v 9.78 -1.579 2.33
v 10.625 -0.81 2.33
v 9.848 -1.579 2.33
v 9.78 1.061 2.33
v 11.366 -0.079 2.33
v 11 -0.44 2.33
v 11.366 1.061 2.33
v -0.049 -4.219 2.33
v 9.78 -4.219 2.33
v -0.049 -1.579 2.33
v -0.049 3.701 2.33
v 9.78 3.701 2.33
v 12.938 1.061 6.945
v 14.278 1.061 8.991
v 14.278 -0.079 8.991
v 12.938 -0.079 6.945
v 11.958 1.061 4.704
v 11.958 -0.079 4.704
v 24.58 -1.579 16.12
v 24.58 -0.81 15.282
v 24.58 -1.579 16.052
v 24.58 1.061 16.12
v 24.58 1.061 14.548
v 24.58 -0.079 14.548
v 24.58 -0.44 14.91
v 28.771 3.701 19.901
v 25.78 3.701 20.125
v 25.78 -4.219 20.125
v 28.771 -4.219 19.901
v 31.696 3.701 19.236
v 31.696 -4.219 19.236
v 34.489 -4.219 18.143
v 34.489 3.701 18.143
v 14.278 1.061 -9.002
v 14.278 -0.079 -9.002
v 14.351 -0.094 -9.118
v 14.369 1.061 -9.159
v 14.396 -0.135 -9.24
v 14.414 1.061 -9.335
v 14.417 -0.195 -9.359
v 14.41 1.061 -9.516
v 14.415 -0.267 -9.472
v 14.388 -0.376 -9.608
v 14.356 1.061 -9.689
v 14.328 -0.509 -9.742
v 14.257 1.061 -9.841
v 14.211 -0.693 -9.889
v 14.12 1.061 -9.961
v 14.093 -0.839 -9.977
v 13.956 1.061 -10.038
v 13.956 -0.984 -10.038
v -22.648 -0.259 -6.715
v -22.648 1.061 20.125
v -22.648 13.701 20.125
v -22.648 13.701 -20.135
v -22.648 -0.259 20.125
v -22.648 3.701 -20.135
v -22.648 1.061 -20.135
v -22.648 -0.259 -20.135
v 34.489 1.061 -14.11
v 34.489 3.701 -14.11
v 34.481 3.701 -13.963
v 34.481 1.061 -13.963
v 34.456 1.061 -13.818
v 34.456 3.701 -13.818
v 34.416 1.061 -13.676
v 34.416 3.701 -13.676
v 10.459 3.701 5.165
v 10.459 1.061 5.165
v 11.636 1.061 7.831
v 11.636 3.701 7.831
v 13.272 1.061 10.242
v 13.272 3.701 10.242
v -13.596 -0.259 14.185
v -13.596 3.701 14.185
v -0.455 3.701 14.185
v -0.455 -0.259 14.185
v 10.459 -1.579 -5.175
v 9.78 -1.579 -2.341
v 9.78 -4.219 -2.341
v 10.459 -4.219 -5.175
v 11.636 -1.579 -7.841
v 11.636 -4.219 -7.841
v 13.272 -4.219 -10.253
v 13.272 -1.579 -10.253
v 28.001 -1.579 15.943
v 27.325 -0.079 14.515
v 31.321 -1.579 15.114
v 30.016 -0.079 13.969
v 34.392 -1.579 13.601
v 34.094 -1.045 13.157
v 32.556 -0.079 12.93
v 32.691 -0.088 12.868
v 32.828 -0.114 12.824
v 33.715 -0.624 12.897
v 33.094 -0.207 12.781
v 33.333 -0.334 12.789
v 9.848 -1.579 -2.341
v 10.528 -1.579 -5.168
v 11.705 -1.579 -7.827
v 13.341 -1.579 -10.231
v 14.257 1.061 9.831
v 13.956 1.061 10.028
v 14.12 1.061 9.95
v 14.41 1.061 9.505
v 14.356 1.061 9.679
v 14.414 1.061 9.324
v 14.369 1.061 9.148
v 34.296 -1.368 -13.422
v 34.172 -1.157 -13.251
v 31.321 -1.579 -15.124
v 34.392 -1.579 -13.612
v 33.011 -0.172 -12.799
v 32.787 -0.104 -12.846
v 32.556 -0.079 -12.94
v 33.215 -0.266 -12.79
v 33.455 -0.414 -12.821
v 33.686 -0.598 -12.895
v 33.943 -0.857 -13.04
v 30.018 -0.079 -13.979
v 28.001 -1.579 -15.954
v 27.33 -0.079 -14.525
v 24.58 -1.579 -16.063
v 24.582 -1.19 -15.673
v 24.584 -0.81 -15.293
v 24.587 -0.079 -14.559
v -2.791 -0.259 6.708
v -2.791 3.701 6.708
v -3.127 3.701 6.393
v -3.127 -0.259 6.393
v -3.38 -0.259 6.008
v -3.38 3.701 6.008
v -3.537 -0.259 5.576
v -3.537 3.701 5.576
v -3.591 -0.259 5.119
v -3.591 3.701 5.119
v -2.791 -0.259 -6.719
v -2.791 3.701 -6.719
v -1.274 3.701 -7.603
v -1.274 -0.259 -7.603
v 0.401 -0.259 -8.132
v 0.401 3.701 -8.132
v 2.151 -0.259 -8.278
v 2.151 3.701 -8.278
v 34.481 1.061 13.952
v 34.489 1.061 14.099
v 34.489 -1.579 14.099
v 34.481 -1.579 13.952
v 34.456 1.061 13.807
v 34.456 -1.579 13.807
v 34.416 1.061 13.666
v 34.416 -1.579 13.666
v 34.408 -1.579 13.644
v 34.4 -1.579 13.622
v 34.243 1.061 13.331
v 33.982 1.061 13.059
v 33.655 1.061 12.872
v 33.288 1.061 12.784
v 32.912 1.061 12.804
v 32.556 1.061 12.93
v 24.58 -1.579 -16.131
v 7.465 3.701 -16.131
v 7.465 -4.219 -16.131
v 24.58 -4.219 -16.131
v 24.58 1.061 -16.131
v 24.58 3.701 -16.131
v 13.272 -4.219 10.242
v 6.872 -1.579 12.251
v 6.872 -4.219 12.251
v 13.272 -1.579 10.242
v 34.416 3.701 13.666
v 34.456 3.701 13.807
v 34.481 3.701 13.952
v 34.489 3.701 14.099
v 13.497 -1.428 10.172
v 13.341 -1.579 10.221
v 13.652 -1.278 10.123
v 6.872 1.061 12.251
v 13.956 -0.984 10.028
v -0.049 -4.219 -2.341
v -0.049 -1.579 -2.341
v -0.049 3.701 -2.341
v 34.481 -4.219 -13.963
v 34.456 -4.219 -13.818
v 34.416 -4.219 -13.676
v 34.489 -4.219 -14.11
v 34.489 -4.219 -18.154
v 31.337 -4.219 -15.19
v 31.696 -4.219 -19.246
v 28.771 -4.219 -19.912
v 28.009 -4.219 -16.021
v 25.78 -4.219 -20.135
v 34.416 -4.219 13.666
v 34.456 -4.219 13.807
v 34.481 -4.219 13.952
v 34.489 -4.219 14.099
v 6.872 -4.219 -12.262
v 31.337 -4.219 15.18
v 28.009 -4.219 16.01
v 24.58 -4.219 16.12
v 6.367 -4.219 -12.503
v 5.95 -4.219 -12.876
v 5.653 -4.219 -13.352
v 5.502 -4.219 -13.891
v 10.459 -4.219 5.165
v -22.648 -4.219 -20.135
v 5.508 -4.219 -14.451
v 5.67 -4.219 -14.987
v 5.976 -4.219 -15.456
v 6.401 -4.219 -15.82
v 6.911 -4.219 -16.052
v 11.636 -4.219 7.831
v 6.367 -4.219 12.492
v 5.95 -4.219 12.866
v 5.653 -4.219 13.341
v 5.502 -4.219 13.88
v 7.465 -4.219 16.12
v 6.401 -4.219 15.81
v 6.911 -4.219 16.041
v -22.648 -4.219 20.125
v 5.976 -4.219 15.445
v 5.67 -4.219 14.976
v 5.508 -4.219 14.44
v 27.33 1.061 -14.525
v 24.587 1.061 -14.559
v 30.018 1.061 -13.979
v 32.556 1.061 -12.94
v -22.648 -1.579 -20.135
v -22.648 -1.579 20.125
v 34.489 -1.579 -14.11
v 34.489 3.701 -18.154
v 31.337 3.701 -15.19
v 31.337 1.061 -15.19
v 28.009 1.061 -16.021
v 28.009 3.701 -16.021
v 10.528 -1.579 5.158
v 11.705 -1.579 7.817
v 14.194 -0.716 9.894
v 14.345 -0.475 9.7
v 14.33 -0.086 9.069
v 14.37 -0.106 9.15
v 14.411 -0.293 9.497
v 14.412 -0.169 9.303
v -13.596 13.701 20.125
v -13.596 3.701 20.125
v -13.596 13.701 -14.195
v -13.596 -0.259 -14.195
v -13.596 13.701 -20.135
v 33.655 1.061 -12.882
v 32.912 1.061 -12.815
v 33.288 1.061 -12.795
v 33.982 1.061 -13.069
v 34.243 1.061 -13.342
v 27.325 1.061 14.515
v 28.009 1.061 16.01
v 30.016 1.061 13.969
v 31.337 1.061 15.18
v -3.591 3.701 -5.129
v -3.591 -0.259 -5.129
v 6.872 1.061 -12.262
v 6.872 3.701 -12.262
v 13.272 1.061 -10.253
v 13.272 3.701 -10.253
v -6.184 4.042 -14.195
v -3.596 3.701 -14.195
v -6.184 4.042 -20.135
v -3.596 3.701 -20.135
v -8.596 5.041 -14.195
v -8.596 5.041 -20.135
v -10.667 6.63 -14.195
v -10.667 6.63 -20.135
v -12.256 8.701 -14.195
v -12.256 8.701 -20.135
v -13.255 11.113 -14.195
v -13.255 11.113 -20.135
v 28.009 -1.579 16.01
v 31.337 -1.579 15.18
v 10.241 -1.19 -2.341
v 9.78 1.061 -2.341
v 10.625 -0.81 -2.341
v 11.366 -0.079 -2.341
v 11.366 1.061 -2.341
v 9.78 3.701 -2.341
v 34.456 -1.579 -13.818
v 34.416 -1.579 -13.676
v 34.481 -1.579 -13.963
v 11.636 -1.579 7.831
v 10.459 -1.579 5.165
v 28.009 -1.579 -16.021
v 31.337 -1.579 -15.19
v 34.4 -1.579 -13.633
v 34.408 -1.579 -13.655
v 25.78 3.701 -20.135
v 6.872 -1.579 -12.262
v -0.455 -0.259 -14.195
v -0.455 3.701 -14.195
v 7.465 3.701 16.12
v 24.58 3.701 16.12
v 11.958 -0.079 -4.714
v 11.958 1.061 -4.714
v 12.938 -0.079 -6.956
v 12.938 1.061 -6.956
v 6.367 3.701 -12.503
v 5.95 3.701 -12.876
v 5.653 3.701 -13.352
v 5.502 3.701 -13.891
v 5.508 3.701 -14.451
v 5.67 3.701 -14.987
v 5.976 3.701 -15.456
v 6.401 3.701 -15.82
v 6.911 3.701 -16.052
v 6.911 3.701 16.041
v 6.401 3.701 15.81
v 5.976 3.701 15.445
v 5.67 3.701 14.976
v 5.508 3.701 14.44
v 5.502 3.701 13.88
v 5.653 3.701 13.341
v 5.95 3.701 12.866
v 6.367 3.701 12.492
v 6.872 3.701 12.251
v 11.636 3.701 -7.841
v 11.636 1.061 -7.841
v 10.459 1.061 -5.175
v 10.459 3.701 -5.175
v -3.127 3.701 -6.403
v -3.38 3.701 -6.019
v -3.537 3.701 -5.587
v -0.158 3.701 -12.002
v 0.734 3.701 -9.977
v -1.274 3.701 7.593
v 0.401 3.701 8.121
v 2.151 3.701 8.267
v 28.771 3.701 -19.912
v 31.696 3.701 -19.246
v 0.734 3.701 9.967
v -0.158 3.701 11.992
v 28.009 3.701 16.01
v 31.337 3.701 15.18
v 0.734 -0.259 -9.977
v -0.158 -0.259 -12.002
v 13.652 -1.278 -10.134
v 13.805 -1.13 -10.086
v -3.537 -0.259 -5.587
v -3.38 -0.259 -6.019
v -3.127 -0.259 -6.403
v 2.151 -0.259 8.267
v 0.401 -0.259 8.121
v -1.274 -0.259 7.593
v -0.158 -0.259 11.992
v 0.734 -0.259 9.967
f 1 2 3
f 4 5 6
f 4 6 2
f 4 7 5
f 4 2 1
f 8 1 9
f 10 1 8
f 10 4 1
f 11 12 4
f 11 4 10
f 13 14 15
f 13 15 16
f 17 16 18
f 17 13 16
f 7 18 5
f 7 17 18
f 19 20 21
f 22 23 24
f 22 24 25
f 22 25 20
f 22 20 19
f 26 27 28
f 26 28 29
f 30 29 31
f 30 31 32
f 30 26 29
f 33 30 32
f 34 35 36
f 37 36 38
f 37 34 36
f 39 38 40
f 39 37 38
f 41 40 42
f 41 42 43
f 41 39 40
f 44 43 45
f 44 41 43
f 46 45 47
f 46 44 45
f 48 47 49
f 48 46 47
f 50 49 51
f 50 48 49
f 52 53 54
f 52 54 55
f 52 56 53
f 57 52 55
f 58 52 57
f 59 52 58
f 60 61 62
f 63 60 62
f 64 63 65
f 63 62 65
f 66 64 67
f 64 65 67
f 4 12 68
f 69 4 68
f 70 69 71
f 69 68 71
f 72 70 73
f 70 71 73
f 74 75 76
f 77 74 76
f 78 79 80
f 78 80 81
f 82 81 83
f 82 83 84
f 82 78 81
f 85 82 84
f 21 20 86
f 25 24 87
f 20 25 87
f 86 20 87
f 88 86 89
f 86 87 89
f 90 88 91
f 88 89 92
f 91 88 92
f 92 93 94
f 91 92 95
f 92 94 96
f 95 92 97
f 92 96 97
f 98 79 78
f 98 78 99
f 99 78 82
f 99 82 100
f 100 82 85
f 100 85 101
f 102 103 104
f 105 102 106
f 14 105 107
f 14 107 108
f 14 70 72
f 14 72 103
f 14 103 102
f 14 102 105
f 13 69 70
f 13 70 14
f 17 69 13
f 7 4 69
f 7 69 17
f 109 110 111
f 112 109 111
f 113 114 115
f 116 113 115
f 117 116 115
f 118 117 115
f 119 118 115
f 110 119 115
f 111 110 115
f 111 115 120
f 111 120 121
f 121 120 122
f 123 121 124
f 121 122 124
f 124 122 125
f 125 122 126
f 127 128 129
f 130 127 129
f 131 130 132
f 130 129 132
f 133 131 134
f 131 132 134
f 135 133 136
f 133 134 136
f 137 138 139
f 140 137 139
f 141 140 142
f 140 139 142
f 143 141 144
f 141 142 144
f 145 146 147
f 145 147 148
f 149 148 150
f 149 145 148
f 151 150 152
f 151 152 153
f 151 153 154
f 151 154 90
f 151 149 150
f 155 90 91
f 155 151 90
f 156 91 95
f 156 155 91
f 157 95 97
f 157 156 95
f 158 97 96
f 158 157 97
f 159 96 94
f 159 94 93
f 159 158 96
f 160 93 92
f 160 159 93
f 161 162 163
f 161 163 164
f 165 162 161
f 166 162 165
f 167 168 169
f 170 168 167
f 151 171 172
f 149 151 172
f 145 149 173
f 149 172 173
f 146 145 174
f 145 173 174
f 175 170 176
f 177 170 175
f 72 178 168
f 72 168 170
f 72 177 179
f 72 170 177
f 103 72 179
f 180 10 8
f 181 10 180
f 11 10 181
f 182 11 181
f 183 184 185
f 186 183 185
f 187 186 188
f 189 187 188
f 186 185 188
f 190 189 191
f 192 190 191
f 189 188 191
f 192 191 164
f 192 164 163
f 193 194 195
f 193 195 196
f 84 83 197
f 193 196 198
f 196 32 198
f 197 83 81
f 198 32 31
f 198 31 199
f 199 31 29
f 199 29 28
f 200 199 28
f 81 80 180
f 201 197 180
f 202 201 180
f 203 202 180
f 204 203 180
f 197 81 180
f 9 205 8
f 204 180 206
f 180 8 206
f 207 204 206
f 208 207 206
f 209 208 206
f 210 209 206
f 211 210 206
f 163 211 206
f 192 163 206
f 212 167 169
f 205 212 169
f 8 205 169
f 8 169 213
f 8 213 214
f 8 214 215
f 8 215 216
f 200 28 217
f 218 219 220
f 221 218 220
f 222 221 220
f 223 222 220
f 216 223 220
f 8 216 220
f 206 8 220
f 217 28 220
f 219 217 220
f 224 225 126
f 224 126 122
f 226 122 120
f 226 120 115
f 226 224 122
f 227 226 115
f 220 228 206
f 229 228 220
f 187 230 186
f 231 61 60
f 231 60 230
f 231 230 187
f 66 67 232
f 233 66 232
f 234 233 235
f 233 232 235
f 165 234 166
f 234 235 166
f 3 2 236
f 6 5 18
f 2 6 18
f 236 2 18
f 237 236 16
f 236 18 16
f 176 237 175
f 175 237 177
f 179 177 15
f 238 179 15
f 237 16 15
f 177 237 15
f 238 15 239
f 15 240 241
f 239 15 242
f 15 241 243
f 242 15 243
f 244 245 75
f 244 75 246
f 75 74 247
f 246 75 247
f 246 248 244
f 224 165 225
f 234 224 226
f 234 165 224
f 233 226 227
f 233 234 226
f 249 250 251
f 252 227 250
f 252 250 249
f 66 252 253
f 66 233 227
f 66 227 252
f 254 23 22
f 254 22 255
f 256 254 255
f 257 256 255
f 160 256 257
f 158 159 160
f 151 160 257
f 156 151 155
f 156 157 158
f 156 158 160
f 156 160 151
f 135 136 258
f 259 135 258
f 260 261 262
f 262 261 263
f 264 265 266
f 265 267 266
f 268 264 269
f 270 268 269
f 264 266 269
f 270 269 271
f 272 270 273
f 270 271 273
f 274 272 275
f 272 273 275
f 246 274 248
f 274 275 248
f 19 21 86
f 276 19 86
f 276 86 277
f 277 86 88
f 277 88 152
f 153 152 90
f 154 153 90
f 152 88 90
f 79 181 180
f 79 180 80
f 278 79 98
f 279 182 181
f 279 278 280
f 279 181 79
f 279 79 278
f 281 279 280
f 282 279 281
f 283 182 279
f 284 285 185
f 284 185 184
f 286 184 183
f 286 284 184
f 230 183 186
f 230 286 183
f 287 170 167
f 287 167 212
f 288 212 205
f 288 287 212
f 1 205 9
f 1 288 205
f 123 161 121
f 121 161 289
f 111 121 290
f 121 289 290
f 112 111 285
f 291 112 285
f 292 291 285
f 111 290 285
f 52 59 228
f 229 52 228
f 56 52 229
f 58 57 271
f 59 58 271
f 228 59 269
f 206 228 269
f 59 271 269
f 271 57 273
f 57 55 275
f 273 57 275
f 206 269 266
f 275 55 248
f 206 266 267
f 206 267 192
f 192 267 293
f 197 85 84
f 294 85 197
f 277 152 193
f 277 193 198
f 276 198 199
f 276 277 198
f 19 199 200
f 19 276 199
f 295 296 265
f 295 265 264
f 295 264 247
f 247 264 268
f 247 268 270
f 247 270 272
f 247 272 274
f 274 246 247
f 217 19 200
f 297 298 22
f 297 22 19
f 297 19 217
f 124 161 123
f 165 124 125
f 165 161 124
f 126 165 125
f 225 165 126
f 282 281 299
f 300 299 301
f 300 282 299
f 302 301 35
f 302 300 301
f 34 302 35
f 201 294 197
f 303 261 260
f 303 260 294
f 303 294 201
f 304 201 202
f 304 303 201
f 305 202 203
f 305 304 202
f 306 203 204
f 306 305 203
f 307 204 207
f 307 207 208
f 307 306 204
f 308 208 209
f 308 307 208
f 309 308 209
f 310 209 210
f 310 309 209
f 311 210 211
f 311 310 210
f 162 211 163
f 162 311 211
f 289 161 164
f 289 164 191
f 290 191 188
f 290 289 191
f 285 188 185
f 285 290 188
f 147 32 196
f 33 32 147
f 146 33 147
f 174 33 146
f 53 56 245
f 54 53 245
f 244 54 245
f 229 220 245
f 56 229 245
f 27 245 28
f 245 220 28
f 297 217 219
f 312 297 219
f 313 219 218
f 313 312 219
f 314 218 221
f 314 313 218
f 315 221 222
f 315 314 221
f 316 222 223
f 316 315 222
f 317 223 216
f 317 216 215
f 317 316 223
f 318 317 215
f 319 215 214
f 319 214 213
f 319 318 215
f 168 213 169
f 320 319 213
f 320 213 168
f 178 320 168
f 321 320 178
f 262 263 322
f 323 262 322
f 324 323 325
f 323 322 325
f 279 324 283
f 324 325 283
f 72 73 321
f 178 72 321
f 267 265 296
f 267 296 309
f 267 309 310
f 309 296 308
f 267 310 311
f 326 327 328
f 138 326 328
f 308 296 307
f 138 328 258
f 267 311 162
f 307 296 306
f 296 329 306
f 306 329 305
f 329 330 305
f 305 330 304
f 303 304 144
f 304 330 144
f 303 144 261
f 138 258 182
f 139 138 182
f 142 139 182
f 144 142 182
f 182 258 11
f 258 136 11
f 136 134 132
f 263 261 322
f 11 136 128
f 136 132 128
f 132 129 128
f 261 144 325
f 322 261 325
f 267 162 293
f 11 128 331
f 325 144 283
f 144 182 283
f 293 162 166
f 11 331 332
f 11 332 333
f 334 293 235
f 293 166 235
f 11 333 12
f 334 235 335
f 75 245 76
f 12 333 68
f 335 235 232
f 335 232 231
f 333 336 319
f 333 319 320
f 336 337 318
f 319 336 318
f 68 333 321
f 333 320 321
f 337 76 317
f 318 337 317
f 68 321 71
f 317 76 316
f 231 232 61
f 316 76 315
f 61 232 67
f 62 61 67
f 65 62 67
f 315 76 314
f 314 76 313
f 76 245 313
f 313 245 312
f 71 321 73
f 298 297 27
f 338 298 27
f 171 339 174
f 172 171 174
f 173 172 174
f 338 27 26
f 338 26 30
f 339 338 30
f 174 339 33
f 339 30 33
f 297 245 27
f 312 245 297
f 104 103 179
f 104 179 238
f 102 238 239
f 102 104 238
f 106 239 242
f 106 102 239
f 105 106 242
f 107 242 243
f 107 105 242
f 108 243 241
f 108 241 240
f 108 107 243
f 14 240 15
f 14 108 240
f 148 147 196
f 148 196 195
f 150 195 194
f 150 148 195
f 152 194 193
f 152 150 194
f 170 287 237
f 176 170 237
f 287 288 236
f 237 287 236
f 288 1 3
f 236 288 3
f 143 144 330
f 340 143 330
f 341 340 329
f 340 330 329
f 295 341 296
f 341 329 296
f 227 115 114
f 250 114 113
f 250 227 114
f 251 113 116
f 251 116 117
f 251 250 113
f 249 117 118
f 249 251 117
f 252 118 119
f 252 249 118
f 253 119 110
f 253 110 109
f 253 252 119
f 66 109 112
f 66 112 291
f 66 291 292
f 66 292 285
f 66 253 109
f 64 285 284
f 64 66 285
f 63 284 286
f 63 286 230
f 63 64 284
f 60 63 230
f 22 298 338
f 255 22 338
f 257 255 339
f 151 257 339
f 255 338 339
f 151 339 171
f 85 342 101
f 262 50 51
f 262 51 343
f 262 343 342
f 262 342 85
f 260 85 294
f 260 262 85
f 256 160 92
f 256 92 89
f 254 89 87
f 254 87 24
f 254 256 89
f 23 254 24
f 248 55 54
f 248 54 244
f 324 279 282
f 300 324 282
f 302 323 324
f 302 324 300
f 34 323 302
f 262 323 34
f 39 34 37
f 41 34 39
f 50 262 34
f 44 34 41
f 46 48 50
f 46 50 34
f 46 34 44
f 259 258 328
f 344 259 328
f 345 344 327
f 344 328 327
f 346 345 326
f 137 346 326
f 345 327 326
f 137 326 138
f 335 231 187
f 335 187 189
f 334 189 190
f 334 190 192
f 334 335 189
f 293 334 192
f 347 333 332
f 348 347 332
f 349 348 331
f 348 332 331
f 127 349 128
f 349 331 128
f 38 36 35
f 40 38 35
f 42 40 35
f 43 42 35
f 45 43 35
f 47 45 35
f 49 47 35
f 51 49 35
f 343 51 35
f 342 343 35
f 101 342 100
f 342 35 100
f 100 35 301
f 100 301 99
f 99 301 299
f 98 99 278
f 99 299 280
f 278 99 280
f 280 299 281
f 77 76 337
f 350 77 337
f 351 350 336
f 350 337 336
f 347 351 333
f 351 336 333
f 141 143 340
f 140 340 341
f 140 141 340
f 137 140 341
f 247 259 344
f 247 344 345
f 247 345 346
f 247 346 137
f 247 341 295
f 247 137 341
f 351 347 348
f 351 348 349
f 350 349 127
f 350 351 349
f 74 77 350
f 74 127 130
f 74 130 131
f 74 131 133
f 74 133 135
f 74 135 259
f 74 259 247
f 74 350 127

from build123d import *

# Parameters (mm, degrees)
BOSS_EXTRUDE1_DEPTH             = 4
SKETCH2_W                       = 7.077783737
SKETCH2_H                       = 4
CUT_EXTRUDE1_DEPTH              = 2.402922374
BOSS_EXTRUDE2_START             = 4
BOSS_EXTRUDE2_DEPTH             = 4
SKETCH4_W                       = 7.077783737
SKETCH4_H                       = 8
CUT_EXTRUDE2_DEPTH              = 14.891763442
BOSS_EXTRUDE3_DEPTH             = 4
CUT_EXTRUDE3_DEPTH              = 6
SCALE1_SCALE                    = 0.6
SCALE2_SCALE                    = 1.1
CHAMFER2_ANGLE                  = 32.170804
CHAMFER3_ANGLE                  = 32.170804
CHAMFER4_ANGLE                  = 37.089833
SKETCH9_W                       = 9.052660039
SKETCH9_H                       = 40.26
BOSS_EXTRUDE4_DEPTH             = 10
BOSS_EXTRUDE4_DIRECTION_2_REACH = 42.714
FILLET1_R                       = 10


with BuildPart() as part:
    # Sketch1 → Boss-Extrude1 (new body)
    with BuildSketch(Plane(origin=(0, 2, 0), x_dir=(1, 0, 0), z_dir=(0, 1, 0))):
        with BuildLine():
            Line((17.294685816, -3.533576913), (17.294685816, 3.544206824))
            ThreePointArc((17.294685816, 3.544206824), (18.863114644, 8.869467938), (21.707787317, 13.636669664))
            ThreePointArc((21.707787317, 13.636669664), (21.87503123, 14.549681712), (21.219564158, 15.2068913))
            Line((21.219564158, 15.2068913), (10.486342132, 18.5754084))
            ThreePointArc((10.486342132, 18.5754084), (8.419274676, 21.892156447), (11.384661403, 24.437754026))
            Line((11.384661403, 24.437754026), (37.31661015, 24.437754026))
            Line((37.31661015, 24.437754026), (37.327723934, 22.056391914))
            ThreePointArc((37.327723934, 22.056391914), (43.539057979, 21.687528752), (49.402053126, 19.603777671))
            ThreePointArc((49.402053126, 19.603777671), (51.365484655, 19.664217825), (52.33016375, 21.37539012))
            Line((52.33016375, 21.37539012), (52.33016375, 27.503190326))
            ThreePointArc((52.33016375, 27.503190326), (45.90109867, 29.745314945), (39.134829344, 30.505314955))
            Line((39.134829344, 30.505314955), (-34.24156443, 30.505314955))
            Line((-34.24156443, 30.505314955), (-34.24156443, -30.494685045))
            Line((-34.24156443, -30.494685045), (39.134829344, -30.494685045))
            ThreePointArc((39.134829344, -30.494685045), (45.90109867, -29.734685035), (52.33016375, -27.492560416))
            Line((52.33016375, -27.492560416), (52.33016375, -21.36476021))
            ThreePointArc((52.33016375, -21.36476021), (51.365484655, -19.653587914), (49.402053126, -19.593147761))
            ThreePointArc((49.402053126, -19.593147761), (43.533593788, -21.678008046), (37.31661015, -22.044848399))
            Line((37.31661015, -22.044848399), (37.31661015, -24.427124116))
            Line((37.31661015, -24.427124116), (11.384661403, -24.427124116))
            ThreePointArc((11.384661403, -24.427124116), (8.419274676, -21.881526536), (10.486342132, -18.564778489))
            Line((10.486342132, -18.564778489), (21.219564158, -15.19626139))
            ThreePointArc((21.219564158, -15.19626139), (21.87503123, -14.539051801), (21.707787317, -13.626039753))
            ThreePointArc((21.707787317, -13.626039753), (18.863114644, -8.858838027), (17.294685816, -3.533576913))
        make_face()
    extrude(amount=-BOSS_EXTRUDE1_DEPTH)

    # Sketch2 → Cut-Extrude1 (cut)
    with BuildSketch(Plane(origin=(17.294685816, 0, 0), x_dir=(0, 0, -1), z_dir=(1, 0, 0))):
        with Locations((0.005314956, 0)):
            Rectangle(SKETCH2_W, SKETCH2_H)
    extrude(amount=-CUT_EXTRUDE1_DEPTH, mode=Mode.SUBTRACT)

    # Sketch3 → Boss-Extrude2 (add)
    with BuildSketch(Plane(origin=(0, 2, 0), x_dir=(-1, 0, 0), z_dir=(0, 1, 0)).offset(BOSS_EXTRUDE2_START)):
        with BuildLine():
            Line((-14.891763442, -3.544206824), (-14.891763442, 3.533576913))
            ThreePointArc((-14.891763442, 3.533576913), (-16.721112086, 9.887878597), (-20.183130277, 15.52153606))
            Line((-20.183130277, 15.52153606), (-10.486342132, 18.564778489))
            ThreePointArc((-10.486342132, 18.564778489), (-8.419274676, 21.881526536), (-11.384661403, 24.427124116))
            Line((-11.384661403, 24.427124116), (-37.31661015, 24.427124116))
            ThreePointArc((-37.31661015, 24.427124116), (-45.066931496, 23.76567922), (-52.219299017, 20.708126414))
            ThreePointArc((-52.219299017, 20.708126414), (-52.302252812, 21.031796649), (-52.33016375, 21.36476021))
            Line((-52.33016375, 21.36476021), (-52.33016375, 27.492560416))
            ThreePointArc((-52.33016375, 27.492560416), (-45.90109867, 29.734685035), (-39.134829344, 30.494685045))
            Line((-39.134829344, 30.494685045), (34.241565294, 30.494685045))
            Line((34.241565294, 30.494685045), (34.241565294, -30.505314955))
            Line((34.241565294, -30.505314955), (-39.134829344, -30.505314955))
            ThreePointArc((-39.134829344, -30.505314955), (-45.90109867, -29.745314945), (-52.33016375, -27.503190326))
            Line((-52.33016375, -27.503190326), (-52.33016375, -21.37539012))
            ThreePointArc((-52.33016375, -21.37539012), (-52.302252812, -21.04242656), (-52.219299017, -20.718756325))
            ThreePointArc((-52.219299017, -20.718756325), (-45.066931496, -23.77630913), (-37.31661015, -24.437754026))
            Line((-37.31661015, -24.437754026), (-11.384661403, -24.437754026))
            ThreePointArc((-11.384661403, -24.437754026), (-8.419274676, -21.892156447), (-10.486342132, -18.5754084))
            Line((-10.486342132, -18.5754084), (-20.183130277, -15.53216597))
            ThreePointArc((-20.183130277, -15.53216597), (-16.721112086, -9.898508508), (-14.891763442, -3.544206824))
        make_face()
    extrude(amount=-BOSS_EXTRUDE2_DEPTH)

    # Sketch4 → Cut-Extrude2 (cut)
    with BuildSketch(Plane(origin=(14.891763442, 0, 0), x_dir=(0, 0, -1), z_dir=(1, 0, 0))):
        with Locations((0.005314956, 2)):
            Rectangle(SKETCH4_W, SKETCH4_H)
    extrude(amount=-CUT_EXTRUDE2_DEPTH, mode=Mode.SUBTRACT)

    # Sketch5 → Boss-Extrude3 (add)
    with BuildSketch(Plane.XZ.offset(2)):
        with BuildLine():
            Line((37.31661015, 24.427124116), (11.384661403, 24.427124116))
            ThreePointArc((11.384661403, 24.427124116), (8.419274676, 21.881526536), (10.486342132, 18.564778489))
            Line((10.486342132, 18.564778489), (20.183130277, 15.52153606))
            ThreePointArc((20.183130277, 15.52153606), (16.721112086, 9.887878597), (14.891763442, 3.533576913))
            Line((14.891763442, 3.533576913), (0, 3.533576913))
            Line((0, 3.533576913), (0, -3.544206824))
            Line((0, -3.544206824), (14.891763442, -3.544206824))
            ThreePointArc((14.891763442, -3.544206824), (16.721112086, -9.898508508), (20.183130277, -15.53216597))
            Line((20.183130277, -15.53216597), (10.486342132, -18.5754084))
            ThreePointArc((10.486342132, -18.5754084), (8.419274676, -21.892156447), (11.384661403, -24.437754026))
            Line((11.384661403, -24.437754026), (37.31661015, -24.437754026))
            ThreePointArc((37.31661015, -24.437754026), (45.066931496, -23.77630913), (52.219299017, -20.718756325))
            ThreePointArc((52.219299017, -20.718756325), (52.302252812, -21.04242656), (52.33016375, -21.37539012))
            Line((52.33016375, -21.37539012), (52.33016375, -27.503190326))
            ThreePointArc((52.33016375, -27.503190326), (45.90109867, -29.745314945), (39.134829344, -30.505314955))
            Line((39.134829344, -30.505314955), (-34.241565294, -30.505314955))
            Line((-34.241565294, -30.505314955), (-34.241565294, 30.494685045))
            Line((-34.241565294, 30.494685045), (39.134829344, 30.494685045))
            ThreePointArc((39.134829344, 30.494685045), (45.90109867, 29.734685035), (52.33016375, 27.492560416))
            Line((52.33016375, 27.492560416), (52.33016375, 21.36476021))
            ThreePointArc((52.33016375, 21.36476021), (52.302252812, 21.031796649), (52.219299017, 20.708126414))
            ThreePointArc((52.219299017, 20.708126414), (45.066931496, 23.76567922), (37.31661015, 24.427124116))
        make_face()
    extrude(amount=BOSS_EXTRUDE3_DEPTH)

    # Sketch6 → Cut-Extrude3 (cut)
    with BuildSketch(Plane(origin=(0, 6, 0), x_dir=(-1, 0, 0), z_dir=(0, 1, 0))):
        with BuildLine():
            Line((34.241565294, 21.494683919), (0.615148415, 21.494683919))
            ThreePointArc((0.615148415, 21.494683919), (-0.40252933, 16.590516303), (-3.333426268, 12.528943807))
            ThreePointArc((-3.333426268, 12.528943807), (0.609678883, 11.977798965), (4.155422589, 10.166848817))
            ThreePointArc((4.155422589, 10.166848817), (5.046731763, 9.106387113), (5.366566942, 7.758530841))
            Line((5.366566942, 7.758530841), (5.366566942, -7.769160752))
            ThreePointArc((5.366566942, -7.769160752), (5.046731763, -9.117017023), (4.155422589, -10.177478728))
            ThreePointArc((4.155422589, -10.177478728), (0.609678883, -11.988428875), (-3.333426268, -12.539573718))
            ThreePointArc((-3.333426268, -12.539573718), (-0.402529103, -16.601146729), (0.615148409, -21.505314955))
            Line((0.615148409, -21.505314955), (34.241565294, -21.505314955))
            Line((34.241565294, -21.505314955), (34.241565294, 21.494683919))
        make_face()
    extrude(amount=-CUT_EXTRUDE3_DEPTH, mode=Mode.SUBTRACT)


with BuildPart() as part_1:
    # Scale1: scaled about (-0.143748337, -0.76143553, -0.005277361)
    add(part.part.scale(SCALE1_SCALE).moved(Location((-0.057499335, -0.304574212, -0.002110944))))


with BuildPart() as part_2:
    # Scale2: scaled about (-0.143748337, -0.76143553, -0.005277361)
    add(part_1.part.scale(SCALE2_SCALE).moved(Location((0.014374834, 0.076143553, 0.000527736))))

    # Chamfer2: read off the stored shape, not the designer's step
    # Chamfer2 outline → Chamfer2 (revolve, cut)
    with BuildSketch(Plane(origin=(25.780112964, 0, -0.005302173), x_dir=(-0.9894243177123465, 0, 0.14505005866754295), z_dir=(-0.14505005866754295, 0, -0.9894243177123465))):
        Polygon((16.1025, -1.578888079), (14.602499776, -0.078887855), (14.602499776, -1.578888079), align=None)
    revolve(axis=Axis((25.780112964, 0, -0.005302173), (0, 1, 0)), revolution_arc=CHAMFER2_ANGLE, mode=Mode.SUBTRACT)

    # Chamfer3: read off the stored shape, not the designer's step
    # Chamfer3 outline → Chamfer3 (revolve, cut)
    with BuildSketch(Plane(origin=(25.780112964, 0, -0.005302173), x_dir=(-0.7602814738740017, 0, -0.6495937811309278), z_dir=(0.6495937811309278, 0, -0.7602814738740017))):
        Polygon((16.1025, -1.578888079), (14.602499776, -0.078887855), (14.602499776, -1.578888079), align=None)
    revolve(axis=Axis((25.780112964, 0, -0.005302173), (0, 1, 0)), revolution_arc=CHAMFER3_ANGLE, mode=Mode.SUBTRACT)

    # Chamfer4: read off the stored shape, not the designer's step
    # Chamfer4 outline → Chamfer4 (revolve, cut)
    with BuildSketch(Plane(origin=(25.780112964, 0, -0.005302173), x_dir=(0.5358984482336857, 0, -0.8442824486987324), z_dir=(0.8442824486987324, 0, 0.5358984482336857))):
        Polygon((16.1025, -1.578888079), (14.602495102, -0.078883181), (14.602495102, -1.578888079), align=None)
    revolve(axis=Axis((25.780112964, 0, -0.005302173), (0, 1, 0)), revolution_arc=CHAMFER4_ANGLE, mode=Mode.SUBTRACT)

    # Chamfer5: read off the stored shape, not the designer's step
    # Chamfer5 outline → Chamfer5 (revolve, cut)
    with BuildSketch(Plane(origin=(25.780112964, 0, -0.005302173), x_dir=(1, 0, 0), z_dir=(0, 0, 1))):
        Polygon((16.1025, -1.578888079), (14.602495102, -0.078883181), (14.602495102, -1.578888079), align=None)
    revolve(axis=Axis((25.780112964, 0, -0.005302173), (0, 1, 0)), mode=Mode.SUBTRACT)

    # Sketch9 → Boss-Extrude4 (add)
    with BuildSketch(Plane(origin=(0, 3.701111921, 0), x_dir=(1, 0, 0), z_dir=(0, 1, 0))):
        with Locations((-18.121977477, 0.005302173)):
            Rectangle(SKETCH9_W, SKETCH9_H)
    extrude(amount=BOSS_EXTRUDE4_DEPTH)

    # Boss-Extrude4 direction 2: up to this face of the body (flat: up to its plane)
    boss_extrude4_direction_2_end = Plane(part_2.part.faces().sort_by_distance((-12.071218374, -0.25888808, -0.005302566))[0])
    # Sketch9 → Boss-Extrude4 direction 2 (add, up to the picked face)
    with BuildSketch(Plane(origin=(0, 3.701111921, 0), x_dir=(1, 0, 0), z_dir=(0, 1, 0)), mode=Mode.PRIVATE) as boss_extrude4_direction_2_sk1:
        with Locations((-18.121977477, 0.005302173)):
            Rectangle(SKETCH9_W, SKETCH9_H)
    boss_extrude4_direction_2_tool1 = split(extrude(boss_extrude4_direction_2_sk1.sketch, amount=-BOSS_EXTRUDE4_DIRECTION_2_REACH, mode=Mode.PRIVATE), bisect_by=boss_extrude4_direction_2_end, keep=Keep.BOTH, mode=Mode.PRIVATE)
    add(boss_extrude4_direction_2_tool1.solids().sort_by(Axis((-18.121977, 3.701112, -0.005302), (0, -1, 0)))[0])

    # Fillet1
    fillet1_edges = [part_2.edges().sort_by_distance(p)[0] for p in [
        (-13.595647458, 3.701111921, -17.165302173),
    ]]
    fillet(fillet1_edges, radius=FILLET1_R - 0.0001)  # a hair under: the kernel refuses the full size


solid = part_2.part
